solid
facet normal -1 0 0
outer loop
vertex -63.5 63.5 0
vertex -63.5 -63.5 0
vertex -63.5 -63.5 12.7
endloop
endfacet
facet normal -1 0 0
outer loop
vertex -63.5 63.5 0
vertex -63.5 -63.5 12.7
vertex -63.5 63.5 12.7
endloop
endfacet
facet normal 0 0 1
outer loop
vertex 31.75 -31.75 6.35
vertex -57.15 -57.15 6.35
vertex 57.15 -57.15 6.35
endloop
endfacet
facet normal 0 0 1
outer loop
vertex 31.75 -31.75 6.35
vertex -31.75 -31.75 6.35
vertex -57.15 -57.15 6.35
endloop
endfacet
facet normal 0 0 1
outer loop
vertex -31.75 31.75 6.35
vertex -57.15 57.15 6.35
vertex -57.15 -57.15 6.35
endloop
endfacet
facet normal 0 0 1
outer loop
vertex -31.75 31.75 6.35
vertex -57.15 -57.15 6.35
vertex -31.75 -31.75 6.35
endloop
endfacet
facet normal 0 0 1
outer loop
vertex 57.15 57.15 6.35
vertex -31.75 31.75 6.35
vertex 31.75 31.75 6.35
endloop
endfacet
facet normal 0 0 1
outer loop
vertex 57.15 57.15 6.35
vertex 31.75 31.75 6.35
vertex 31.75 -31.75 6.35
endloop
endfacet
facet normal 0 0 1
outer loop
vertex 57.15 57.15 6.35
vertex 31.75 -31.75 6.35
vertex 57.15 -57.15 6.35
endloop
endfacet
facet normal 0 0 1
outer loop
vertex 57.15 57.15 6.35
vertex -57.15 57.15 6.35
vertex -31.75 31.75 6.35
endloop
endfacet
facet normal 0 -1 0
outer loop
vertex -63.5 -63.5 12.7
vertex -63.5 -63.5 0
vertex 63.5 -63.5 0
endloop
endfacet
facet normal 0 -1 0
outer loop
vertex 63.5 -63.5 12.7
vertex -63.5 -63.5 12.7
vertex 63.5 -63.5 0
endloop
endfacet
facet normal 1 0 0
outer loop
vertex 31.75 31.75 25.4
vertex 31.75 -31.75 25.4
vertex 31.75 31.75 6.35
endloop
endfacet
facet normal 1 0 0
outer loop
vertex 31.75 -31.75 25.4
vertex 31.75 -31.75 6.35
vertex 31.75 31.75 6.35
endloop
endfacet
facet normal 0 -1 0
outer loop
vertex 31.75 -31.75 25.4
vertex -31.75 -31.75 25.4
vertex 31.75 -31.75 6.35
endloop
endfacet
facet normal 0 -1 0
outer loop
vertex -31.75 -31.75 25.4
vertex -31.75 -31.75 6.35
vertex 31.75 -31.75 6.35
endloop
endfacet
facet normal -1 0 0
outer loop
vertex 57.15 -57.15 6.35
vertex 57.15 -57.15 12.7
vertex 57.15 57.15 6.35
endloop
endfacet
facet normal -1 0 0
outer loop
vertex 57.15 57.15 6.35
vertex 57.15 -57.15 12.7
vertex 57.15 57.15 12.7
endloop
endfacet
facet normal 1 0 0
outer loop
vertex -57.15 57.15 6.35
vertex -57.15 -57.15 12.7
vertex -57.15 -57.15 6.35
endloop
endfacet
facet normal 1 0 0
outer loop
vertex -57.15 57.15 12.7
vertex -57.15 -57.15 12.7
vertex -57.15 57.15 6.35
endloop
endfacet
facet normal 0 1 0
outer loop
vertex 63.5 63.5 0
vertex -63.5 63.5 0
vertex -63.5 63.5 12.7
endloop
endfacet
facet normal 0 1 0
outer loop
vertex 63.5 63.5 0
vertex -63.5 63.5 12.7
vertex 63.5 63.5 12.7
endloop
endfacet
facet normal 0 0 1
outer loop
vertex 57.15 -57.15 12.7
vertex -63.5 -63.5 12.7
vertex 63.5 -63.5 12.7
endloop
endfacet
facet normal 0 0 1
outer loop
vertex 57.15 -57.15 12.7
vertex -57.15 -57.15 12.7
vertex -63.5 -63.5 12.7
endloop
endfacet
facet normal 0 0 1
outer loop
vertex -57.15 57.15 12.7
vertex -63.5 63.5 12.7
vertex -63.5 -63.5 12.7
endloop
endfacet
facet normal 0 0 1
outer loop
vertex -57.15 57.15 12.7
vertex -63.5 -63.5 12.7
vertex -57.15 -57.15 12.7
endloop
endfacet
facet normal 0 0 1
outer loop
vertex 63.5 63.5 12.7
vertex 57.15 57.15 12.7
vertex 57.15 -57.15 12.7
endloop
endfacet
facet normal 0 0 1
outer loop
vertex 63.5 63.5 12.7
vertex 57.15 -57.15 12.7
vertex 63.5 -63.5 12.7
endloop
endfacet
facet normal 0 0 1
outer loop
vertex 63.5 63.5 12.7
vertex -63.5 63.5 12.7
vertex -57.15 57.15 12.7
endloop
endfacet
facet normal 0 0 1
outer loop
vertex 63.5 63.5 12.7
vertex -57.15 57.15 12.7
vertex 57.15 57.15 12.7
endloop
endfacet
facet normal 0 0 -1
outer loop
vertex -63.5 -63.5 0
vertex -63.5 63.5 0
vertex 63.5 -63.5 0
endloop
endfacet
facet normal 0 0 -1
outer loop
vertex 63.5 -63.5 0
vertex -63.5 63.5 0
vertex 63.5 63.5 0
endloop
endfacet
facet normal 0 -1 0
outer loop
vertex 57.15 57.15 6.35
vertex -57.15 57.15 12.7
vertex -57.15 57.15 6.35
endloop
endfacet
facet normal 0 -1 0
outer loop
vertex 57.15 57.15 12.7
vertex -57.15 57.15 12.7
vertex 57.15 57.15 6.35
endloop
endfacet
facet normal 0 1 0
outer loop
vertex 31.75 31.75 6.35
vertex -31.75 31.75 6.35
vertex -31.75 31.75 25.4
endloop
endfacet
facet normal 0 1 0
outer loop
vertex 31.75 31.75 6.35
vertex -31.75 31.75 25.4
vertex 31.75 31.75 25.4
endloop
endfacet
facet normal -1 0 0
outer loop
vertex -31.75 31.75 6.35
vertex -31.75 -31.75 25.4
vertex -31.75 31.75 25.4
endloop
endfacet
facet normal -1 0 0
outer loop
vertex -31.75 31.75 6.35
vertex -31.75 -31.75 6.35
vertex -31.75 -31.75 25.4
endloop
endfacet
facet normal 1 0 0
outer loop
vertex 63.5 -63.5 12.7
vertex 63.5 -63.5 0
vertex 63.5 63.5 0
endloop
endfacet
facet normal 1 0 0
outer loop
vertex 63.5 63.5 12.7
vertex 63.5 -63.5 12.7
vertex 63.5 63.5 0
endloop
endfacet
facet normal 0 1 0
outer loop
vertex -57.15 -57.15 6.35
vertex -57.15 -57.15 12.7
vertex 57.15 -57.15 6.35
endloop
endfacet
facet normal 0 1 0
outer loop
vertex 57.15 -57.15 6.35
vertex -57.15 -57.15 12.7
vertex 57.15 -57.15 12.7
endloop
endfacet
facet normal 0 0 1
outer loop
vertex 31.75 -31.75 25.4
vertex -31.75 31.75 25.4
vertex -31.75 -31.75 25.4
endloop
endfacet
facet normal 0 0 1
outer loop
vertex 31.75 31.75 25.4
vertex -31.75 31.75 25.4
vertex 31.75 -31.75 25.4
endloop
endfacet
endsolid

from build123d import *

# Parameters (mm, degrees)
F0_W      = 127
F0_H      = 127
F1_DEPTH  = 12.7
F2_W      = 114.3
F2_H      = 114.3
F2_W_2    = 63.5
F2_H_2    = 63.5
F3_DEPTH  = 6.35
F3_FACE_W = 63.5
F3_FACE_H = 63.5
F4_DEPTH  = 12.7


with BuildPart() as f1:
    # F0 (on Top) → F1 (new body)
    with BuildSketch(Plane.XY):
        Rectangle(F0_W, F0_H)
    extrude(amount=F1_DEPTH)

    # F2 (on face) → F3 (cut)
    with BuildSketch(Plane.XY.offset(12.7)):
        Rectangle(F2_W, F2_H)
        Rectangle(F2_W_2, F2_H_2, mode=Mode.SUBTRACT)
    extrude(amount=-F3_DEPTH, mode=Mode.SUBTRACT)

    # F3_face (on face) → F4 (join)
    with BuildSketch(Plane.XY.offset(12.7)):
        Rectangle(F3_FACE_W, F3_FACE_H)
    extrude(amount=F4_DEPTH)


solid = f1.part
